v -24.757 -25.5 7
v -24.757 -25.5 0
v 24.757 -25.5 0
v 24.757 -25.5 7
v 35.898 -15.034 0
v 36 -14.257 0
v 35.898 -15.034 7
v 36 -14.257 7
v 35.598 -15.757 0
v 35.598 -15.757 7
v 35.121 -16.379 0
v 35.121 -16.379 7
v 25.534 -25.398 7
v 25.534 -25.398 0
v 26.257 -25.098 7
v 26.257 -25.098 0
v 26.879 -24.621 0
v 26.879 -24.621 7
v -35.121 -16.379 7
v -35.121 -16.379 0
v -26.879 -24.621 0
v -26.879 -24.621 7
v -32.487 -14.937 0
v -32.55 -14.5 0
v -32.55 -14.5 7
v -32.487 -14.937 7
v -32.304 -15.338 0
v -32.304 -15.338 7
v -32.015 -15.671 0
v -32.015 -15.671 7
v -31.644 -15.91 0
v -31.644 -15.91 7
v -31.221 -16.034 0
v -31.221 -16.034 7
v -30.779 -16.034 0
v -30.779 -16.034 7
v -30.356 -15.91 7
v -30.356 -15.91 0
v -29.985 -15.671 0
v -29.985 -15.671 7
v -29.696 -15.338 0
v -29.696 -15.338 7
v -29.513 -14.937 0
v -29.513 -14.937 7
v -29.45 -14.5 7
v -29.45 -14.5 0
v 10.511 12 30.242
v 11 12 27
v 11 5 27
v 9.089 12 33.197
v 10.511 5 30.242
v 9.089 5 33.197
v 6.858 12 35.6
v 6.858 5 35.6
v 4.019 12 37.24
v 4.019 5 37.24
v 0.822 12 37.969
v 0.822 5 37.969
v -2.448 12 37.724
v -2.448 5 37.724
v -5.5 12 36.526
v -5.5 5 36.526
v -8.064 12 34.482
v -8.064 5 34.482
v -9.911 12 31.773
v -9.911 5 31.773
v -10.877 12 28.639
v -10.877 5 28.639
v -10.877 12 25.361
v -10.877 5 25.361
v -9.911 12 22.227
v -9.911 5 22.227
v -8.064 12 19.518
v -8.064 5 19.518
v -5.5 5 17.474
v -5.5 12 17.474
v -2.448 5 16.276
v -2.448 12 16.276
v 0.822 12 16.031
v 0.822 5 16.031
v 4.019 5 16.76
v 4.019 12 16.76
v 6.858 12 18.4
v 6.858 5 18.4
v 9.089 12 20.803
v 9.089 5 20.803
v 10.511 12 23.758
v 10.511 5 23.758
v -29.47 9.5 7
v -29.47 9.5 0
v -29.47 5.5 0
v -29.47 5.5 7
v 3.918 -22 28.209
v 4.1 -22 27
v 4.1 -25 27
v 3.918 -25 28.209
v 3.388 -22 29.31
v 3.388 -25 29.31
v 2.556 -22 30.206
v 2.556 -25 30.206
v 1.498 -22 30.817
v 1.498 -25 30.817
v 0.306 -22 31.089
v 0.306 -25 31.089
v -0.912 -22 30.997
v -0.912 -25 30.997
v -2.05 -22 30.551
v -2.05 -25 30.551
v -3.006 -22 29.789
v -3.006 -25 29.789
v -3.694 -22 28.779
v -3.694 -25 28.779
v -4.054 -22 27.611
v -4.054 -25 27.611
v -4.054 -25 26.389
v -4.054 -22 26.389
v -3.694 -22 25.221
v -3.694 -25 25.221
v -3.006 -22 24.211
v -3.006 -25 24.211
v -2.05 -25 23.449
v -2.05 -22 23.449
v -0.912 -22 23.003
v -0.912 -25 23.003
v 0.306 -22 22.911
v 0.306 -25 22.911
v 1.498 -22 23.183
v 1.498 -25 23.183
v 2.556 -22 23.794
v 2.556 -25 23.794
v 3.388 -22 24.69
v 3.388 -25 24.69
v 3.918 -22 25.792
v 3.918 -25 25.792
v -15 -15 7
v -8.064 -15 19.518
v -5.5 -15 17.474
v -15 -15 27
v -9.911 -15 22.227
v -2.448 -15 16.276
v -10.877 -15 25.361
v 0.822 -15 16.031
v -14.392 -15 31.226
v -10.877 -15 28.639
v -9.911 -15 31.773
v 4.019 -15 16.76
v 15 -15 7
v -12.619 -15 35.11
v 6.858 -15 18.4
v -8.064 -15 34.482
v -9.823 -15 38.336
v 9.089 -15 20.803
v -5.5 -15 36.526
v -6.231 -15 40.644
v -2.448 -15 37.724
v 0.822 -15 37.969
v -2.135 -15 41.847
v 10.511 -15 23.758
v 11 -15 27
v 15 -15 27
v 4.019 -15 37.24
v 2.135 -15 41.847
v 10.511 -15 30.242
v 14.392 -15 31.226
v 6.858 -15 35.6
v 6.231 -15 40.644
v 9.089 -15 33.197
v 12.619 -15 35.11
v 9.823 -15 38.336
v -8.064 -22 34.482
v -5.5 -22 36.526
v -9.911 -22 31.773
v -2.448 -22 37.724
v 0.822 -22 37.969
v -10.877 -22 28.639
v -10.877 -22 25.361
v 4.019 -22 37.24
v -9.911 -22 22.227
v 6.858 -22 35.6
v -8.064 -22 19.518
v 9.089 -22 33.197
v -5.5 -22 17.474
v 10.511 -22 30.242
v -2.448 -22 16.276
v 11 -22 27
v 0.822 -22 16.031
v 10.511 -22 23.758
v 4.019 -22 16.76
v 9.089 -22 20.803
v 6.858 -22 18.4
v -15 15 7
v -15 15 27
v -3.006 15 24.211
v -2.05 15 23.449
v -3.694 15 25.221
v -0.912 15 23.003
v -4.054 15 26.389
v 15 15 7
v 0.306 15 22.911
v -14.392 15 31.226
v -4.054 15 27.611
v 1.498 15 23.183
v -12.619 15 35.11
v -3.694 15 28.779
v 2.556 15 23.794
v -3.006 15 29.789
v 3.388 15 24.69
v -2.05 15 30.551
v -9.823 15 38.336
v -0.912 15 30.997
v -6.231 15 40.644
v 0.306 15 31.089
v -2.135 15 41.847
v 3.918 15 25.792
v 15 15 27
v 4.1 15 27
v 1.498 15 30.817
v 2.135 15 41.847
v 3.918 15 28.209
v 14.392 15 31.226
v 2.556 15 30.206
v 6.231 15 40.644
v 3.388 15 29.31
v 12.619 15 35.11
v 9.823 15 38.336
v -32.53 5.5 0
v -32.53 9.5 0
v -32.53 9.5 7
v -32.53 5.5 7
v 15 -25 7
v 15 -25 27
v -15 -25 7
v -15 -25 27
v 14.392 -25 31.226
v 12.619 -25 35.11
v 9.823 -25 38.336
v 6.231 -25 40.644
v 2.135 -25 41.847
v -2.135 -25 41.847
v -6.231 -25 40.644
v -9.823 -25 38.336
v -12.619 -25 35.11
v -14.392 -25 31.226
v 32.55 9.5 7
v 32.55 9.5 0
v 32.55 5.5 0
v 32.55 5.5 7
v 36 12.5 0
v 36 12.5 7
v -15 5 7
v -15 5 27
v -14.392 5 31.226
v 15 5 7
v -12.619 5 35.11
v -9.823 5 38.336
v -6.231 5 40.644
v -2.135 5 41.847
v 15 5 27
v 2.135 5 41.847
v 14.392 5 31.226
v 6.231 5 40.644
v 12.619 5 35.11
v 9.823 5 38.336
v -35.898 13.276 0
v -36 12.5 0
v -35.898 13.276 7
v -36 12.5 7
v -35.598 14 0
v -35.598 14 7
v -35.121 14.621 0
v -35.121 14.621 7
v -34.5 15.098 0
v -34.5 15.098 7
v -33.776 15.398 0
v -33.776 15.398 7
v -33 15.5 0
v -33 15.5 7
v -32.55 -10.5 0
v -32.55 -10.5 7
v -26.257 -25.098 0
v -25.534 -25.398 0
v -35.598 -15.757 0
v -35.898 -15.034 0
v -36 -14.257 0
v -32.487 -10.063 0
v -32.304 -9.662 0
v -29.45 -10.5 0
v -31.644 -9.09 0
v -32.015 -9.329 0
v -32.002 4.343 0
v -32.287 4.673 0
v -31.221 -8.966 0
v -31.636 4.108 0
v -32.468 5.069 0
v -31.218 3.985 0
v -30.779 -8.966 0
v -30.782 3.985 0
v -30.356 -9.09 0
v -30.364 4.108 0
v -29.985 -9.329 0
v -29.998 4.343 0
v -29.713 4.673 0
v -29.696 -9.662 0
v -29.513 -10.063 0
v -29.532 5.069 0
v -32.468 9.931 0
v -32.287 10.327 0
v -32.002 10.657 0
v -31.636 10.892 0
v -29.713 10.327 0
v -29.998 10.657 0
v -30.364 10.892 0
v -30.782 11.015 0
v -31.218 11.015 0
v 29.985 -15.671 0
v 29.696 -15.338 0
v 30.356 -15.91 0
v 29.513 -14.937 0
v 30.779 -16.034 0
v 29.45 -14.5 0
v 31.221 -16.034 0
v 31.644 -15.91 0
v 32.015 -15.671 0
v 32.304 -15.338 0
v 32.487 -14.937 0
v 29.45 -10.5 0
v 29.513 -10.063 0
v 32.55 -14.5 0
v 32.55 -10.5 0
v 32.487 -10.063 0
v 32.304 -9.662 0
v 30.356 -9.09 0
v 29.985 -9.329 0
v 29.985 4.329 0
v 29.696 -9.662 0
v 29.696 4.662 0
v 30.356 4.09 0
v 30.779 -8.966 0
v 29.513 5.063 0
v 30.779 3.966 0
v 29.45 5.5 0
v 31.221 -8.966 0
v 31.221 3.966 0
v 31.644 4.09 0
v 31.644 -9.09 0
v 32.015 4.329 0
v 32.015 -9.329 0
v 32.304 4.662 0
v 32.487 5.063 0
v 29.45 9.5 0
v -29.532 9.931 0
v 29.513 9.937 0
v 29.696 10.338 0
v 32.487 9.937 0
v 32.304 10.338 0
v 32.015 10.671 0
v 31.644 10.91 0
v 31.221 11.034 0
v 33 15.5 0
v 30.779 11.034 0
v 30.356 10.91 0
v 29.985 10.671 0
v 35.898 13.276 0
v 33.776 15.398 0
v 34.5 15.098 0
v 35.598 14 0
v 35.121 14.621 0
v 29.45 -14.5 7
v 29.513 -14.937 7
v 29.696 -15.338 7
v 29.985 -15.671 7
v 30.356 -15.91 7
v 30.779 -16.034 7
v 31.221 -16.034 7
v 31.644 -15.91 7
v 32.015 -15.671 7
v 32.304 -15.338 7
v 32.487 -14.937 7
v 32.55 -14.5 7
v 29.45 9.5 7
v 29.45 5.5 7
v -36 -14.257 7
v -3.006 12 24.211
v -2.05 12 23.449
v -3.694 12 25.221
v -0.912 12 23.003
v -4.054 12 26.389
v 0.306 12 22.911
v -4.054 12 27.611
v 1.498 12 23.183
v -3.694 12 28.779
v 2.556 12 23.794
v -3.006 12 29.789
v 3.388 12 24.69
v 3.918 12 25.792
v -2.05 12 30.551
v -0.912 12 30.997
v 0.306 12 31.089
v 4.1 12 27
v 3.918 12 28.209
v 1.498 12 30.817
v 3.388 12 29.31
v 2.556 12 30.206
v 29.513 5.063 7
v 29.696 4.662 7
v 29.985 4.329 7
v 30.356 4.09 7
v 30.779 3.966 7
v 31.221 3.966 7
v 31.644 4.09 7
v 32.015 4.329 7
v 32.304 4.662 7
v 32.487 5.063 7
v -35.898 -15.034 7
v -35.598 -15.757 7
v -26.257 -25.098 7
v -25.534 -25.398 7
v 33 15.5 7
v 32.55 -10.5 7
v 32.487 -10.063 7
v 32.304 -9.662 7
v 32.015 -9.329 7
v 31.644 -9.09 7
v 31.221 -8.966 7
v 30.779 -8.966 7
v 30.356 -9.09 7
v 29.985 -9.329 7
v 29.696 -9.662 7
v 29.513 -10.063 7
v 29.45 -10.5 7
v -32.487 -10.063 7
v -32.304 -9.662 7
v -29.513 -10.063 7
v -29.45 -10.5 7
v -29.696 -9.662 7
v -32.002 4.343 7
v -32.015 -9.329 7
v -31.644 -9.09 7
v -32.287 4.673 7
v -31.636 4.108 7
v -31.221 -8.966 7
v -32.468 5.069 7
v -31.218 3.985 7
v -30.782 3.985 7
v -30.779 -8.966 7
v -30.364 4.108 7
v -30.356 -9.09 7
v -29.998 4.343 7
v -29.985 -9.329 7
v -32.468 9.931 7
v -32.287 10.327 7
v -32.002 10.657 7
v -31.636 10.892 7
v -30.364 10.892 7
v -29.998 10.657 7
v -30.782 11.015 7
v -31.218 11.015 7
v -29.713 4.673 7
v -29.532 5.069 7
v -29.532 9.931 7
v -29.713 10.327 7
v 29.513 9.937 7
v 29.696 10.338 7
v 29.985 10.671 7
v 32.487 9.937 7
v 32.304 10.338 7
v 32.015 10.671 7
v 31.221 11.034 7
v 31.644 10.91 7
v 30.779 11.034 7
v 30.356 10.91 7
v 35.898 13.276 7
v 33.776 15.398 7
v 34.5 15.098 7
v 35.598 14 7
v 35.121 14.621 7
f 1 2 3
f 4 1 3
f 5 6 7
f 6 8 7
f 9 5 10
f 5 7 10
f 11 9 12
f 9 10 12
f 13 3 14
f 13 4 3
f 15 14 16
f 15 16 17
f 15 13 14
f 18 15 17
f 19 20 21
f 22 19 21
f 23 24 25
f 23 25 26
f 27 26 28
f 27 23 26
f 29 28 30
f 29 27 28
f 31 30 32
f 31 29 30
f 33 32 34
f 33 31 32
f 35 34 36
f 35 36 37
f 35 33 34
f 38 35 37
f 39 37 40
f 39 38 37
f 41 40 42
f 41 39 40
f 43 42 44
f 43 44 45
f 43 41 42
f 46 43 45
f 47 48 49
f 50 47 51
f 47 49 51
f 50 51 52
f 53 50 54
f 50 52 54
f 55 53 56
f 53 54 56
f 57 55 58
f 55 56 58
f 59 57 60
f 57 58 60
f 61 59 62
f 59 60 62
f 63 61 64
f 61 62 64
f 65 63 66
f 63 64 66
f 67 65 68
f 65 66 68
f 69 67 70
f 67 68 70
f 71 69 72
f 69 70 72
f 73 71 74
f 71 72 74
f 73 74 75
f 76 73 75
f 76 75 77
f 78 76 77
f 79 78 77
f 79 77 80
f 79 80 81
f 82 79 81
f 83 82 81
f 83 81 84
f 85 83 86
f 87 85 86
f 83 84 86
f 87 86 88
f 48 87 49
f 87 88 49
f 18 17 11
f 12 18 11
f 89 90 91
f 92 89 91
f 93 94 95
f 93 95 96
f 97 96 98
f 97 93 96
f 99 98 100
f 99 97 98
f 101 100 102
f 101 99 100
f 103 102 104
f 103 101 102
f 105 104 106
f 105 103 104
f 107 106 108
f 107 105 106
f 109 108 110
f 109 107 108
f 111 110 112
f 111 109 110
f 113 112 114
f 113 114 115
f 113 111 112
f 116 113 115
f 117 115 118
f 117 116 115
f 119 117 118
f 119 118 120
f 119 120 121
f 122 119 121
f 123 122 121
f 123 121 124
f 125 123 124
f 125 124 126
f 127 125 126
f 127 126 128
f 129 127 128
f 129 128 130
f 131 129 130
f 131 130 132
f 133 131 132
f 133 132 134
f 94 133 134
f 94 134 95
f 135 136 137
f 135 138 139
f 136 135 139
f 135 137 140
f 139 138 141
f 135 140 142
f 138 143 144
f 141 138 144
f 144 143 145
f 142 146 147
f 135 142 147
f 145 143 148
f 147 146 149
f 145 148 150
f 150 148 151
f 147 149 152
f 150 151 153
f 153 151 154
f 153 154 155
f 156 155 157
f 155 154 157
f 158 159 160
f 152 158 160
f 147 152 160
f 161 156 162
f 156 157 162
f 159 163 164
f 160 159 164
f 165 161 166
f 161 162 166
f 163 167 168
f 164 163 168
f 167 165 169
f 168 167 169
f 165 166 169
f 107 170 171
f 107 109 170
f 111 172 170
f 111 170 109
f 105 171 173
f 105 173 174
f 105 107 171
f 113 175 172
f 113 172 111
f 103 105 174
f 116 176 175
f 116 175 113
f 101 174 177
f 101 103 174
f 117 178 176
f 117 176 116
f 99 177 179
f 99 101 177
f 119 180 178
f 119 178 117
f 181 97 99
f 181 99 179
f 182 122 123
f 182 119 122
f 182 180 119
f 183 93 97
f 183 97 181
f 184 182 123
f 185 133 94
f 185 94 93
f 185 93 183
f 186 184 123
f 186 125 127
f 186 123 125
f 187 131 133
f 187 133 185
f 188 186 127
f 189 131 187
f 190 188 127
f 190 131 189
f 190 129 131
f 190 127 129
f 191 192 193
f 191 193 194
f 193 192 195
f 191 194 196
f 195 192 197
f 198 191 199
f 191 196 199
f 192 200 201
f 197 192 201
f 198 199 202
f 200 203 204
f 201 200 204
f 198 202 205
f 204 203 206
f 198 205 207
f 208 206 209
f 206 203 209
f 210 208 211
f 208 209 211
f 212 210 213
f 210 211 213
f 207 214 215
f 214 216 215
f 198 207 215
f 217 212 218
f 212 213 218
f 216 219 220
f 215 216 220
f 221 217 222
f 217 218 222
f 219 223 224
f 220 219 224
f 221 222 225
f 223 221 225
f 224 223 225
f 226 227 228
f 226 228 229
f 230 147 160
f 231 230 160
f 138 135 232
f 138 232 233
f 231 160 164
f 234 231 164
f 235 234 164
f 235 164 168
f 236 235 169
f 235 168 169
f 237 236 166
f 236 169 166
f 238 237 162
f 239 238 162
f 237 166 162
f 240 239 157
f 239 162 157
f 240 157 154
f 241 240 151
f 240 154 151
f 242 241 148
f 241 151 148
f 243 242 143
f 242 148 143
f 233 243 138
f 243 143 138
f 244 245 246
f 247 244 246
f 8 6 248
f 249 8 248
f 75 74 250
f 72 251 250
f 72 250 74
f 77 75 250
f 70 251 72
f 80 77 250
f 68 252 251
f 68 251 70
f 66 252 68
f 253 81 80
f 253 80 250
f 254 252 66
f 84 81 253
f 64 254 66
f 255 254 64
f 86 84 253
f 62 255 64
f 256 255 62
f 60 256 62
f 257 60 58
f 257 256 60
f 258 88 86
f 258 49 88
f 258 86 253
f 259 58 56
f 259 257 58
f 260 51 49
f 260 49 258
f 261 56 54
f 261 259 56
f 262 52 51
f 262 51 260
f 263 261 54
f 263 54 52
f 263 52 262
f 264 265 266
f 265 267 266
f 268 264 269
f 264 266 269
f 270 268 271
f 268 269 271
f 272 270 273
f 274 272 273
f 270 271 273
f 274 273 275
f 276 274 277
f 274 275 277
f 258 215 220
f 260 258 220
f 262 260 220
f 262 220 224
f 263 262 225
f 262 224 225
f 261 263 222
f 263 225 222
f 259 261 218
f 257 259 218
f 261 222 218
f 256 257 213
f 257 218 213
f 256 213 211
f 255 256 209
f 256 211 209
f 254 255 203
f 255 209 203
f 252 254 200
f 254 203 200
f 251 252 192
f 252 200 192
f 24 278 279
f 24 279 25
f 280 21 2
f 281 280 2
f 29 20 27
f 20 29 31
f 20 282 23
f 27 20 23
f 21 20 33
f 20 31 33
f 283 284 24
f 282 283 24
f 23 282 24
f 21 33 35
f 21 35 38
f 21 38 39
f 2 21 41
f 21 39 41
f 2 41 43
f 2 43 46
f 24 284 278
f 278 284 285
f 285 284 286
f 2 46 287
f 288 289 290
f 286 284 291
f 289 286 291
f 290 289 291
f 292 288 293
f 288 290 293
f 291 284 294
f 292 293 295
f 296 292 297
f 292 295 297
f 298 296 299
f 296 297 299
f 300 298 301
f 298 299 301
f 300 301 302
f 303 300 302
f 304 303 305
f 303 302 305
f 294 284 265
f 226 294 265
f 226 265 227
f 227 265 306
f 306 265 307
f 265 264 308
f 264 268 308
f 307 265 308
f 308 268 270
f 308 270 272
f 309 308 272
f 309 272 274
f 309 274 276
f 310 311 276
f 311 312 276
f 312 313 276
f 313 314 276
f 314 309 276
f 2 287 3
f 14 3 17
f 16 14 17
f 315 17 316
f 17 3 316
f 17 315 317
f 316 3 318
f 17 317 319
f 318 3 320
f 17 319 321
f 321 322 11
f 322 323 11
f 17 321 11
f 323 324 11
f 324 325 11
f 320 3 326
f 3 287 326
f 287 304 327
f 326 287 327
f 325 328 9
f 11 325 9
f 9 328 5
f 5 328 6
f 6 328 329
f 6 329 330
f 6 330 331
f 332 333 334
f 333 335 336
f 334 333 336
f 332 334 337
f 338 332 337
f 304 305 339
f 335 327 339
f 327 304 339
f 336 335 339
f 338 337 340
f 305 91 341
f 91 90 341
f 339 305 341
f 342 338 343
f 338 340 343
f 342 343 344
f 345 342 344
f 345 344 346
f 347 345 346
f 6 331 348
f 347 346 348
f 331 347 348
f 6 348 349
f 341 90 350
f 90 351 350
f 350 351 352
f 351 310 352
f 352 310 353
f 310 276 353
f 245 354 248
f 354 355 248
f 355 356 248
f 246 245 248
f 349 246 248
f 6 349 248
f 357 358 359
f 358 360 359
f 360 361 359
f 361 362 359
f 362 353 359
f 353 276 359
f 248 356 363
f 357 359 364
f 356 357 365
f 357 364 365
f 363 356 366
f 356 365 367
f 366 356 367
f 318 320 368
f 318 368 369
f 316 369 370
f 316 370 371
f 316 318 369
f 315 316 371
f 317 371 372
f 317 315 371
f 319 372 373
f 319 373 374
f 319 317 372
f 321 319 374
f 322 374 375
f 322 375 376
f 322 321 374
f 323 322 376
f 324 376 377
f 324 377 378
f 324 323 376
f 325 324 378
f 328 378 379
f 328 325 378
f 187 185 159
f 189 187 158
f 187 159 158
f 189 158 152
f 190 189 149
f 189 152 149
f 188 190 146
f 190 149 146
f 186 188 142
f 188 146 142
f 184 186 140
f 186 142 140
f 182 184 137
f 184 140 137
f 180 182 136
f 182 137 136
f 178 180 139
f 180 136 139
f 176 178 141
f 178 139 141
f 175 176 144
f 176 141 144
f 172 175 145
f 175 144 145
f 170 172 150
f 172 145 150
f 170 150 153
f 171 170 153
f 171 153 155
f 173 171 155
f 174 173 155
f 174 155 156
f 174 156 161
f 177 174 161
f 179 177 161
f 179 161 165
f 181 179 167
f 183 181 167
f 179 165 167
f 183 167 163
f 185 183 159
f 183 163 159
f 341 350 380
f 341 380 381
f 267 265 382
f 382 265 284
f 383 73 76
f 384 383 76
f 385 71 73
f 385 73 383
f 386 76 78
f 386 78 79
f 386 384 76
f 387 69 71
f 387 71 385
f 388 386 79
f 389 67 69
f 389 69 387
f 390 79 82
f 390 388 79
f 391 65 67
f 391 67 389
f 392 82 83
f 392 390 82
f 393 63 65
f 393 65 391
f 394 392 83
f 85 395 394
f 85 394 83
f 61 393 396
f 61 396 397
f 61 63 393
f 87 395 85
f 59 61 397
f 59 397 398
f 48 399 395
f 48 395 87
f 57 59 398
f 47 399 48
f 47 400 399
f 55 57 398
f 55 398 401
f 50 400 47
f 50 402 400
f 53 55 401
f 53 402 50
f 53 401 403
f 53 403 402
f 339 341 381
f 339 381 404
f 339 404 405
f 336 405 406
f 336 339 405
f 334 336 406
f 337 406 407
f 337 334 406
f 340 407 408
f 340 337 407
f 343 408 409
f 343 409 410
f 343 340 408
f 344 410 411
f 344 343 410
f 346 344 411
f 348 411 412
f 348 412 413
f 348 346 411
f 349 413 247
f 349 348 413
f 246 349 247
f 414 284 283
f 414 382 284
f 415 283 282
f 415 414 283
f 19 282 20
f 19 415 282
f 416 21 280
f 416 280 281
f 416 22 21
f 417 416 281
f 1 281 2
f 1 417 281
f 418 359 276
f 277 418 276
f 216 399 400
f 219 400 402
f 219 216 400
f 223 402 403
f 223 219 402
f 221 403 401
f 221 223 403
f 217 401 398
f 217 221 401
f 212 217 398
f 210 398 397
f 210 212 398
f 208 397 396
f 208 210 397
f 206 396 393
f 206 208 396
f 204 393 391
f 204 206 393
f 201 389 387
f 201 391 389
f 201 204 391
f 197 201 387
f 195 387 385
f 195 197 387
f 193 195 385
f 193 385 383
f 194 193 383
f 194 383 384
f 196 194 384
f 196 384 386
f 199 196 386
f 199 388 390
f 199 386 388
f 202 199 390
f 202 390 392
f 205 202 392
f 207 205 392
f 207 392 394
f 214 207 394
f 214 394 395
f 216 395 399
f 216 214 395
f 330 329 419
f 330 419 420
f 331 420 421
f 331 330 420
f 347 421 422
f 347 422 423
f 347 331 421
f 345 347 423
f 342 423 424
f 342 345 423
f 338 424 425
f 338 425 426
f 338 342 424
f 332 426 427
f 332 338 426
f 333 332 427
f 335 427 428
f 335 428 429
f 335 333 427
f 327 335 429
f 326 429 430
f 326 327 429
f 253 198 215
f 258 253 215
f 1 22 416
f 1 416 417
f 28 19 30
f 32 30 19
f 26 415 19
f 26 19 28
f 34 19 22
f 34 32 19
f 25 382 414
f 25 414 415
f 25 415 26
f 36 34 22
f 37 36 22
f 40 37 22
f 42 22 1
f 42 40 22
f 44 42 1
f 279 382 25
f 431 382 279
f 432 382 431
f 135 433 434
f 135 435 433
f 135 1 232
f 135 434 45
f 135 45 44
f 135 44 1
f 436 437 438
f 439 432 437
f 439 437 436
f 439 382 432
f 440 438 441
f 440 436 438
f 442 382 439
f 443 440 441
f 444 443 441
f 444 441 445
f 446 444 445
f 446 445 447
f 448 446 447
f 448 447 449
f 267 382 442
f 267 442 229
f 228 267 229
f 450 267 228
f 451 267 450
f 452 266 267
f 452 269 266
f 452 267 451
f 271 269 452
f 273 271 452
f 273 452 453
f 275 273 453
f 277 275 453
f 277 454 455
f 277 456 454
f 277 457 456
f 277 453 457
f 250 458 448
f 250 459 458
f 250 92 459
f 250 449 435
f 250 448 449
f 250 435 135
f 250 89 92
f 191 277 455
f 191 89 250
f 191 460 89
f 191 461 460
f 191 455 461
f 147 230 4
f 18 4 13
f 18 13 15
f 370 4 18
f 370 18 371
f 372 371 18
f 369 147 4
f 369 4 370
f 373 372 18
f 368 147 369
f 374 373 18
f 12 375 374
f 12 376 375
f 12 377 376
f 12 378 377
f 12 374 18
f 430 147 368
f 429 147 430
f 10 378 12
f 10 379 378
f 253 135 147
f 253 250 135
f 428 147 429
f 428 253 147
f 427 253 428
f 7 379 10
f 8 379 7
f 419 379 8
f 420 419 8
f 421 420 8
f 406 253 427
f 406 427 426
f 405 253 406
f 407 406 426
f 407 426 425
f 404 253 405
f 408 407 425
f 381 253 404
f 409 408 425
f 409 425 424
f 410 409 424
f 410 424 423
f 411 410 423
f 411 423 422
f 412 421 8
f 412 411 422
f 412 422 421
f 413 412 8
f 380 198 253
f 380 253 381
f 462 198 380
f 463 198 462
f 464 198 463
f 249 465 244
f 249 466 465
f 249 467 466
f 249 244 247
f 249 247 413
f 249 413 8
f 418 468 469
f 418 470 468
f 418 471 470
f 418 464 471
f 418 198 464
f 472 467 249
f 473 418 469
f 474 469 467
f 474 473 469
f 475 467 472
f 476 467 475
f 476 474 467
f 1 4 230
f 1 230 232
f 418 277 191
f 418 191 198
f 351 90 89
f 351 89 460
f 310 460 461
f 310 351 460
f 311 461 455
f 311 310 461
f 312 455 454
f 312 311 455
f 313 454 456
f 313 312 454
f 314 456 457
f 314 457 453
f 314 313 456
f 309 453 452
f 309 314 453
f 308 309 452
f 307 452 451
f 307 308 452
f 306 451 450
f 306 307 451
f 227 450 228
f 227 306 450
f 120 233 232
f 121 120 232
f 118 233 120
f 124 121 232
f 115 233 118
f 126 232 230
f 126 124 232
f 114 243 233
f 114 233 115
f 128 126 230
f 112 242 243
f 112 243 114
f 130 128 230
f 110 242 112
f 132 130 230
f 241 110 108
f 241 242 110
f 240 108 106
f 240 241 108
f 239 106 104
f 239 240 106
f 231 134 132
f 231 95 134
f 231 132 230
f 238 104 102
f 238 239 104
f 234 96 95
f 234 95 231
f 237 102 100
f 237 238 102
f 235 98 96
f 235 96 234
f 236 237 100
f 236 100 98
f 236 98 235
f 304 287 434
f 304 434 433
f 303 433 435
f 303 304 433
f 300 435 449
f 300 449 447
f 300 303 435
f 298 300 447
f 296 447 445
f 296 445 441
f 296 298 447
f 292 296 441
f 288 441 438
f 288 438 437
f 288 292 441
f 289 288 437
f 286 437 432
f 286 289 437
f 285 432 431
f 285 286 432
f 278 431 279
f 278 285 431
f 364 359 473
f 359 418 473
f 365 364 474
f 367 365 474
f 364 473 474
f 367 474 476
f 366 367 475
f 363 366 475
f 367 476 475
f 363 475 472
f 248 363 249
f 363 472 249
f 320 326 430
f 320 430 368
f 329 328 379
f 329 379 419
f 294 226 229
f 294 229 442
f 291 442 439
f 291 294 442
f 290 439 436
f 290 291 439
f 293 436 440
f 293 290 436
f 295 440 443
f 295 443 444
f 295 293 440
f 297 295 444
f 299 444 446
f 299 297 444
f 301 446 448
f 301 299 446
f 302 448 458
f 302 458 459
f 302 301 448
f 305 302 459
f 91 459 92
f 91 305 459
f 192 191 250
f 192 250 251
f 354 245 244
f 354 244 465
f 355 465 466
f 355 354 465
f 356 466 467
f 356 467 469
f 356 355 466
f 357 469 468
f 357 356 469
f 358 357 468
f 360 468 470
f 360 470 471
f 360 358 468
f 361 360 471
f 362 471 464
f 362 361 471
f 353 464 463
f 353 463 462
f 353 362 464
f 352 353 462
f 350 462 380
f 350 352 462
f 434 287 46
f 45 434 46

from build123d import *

# Parameters (mm, degrees)
SKETCH004_R     = 4.1
PAD002_DEPTH    = 10
SKETCH005_R     = 11
POCKET001_DEPTH = 7
PAD_DEPTH       = 7
FILLET_R        = 3
SKETCH002_R     = 4.1
PAD001_DEPTH    = 10
SKETCH003_R     = 11
POCKET_DEPTH    = 7


with BuildPart() as pocket001:
    # Sketch004 → Pad002 (new body)
    with BuildSketch(Plane.XZ.offset(15)):
        with BuildLine():
            Line((-15, 7), (15, 7))
            Line((15, 7), (15, 27))
            ThreePointArc((15, 27), (0, 42.000006), (-15, 27))
            Line((-15, 7), (-15, 27))
        make_face()
        with Locations((0, 27.000006)):
            Circle(SKETCH004_R, mode=Mode.SUBTRACT)
    extrude(amount=PAD002_DEPTH)

    # Sketch005 → Pocket001 (cut)
    with BuildSketch(Plane(origin=(0, -15, 0), x_dir=(1, 0, 0), z_dir=(0, 1, 0))):
        with Locations((0, -27.000006)):
            Circle(SKETCH005_R)
    extrude(amount=-POCKET001_DEPTH, mode=Mode.SUBTRACT)


with BuildPart() as grundplatte001:
    # Sketch → Pad (new body)
    with BuildSketch(Plane.XY):
        Polygon((-36, 15.5), (-36, -15.5), (-26, -25.5), (26, -25.5), (36, -15.5), (36, 15.5), align=None)
        with BuildLine():
            Line((-32.53033, 9.500002), (-32.53033, 5.5))
            ThreePointArc((-32.53033, 5.5), (-31, 3.96967), (-29.46967, 5.5))
            Line((-29.46967, 9.500002), (-29.46967, 5.5))
            ThreePointArc((-29.46967, 9.500002), (-31, 11.03033), (-32.53033, 9.500002))
        make_face(mode=Mode.SUBTRACT)
        with BuildLine():
            Line((-32.55, -10.499998), (-32.55, -14.5))
            ThreePointArc((-32.55, -14.5), (-31, -16.05), (-29.45, -14.5))
            Line((-29.45, -10.499998), (-29.45, -14.5))
            ThreePointArc((-29.45, -10.499998), (-31, -8.95), (-32.55, -10.499998))
        make_face(mode=Mode.SUBTRACT)
        with BuildLine():
            Line((29.45, -10.500011), (29.45, -14.500004))
            ThreePointArc((29.45, -14.500004), (31, -16.05), (32.55, -14.500004))
            Line((32.55, -14.500004), (32.55, -10.500011))
            ThreePointArc((32.55, -10.500011), (31, -8.95), (29.45, -10.500011))
        make_face(mode=Mode.SUBTRACT)
        with BuildLine():
            Line((32.55, 9.500002), (32.55, 5.5))
            ThreePointArc((29.45, 5.5), (31, 3.95), (32.55, 5.5))
            Line((29.45, 9.500002), (29.45, 5.5))
            ThreePointArc((32.55, 9.500002), (31, 11.05), (29.45, 9.500002))
        make_face(mode=Mode.SUBTRACT)
    extrude(amount=PAD_DEPTH)

    # Fillet
    fillet_edges = [grundplatte001.edges().sort_by_distance(p)[0] for p in [
        (26, -25.5, 3.5),
        (-26, -25.5, 3.5),
        (36, -15.5, 3.5),
        (-36, -15.5, 3.5),
        (36, 15.5, 3.5),
        (-36, 15.5, 3.5),
    ]]
    fillet(fillet_edges, radius=FILLET_R)


with BuildPart() as fusion001:
    # Fusion001 base: copy of Grundplatte001
    add(grundplatte001.part)

    # Fusion001: union Pocket001
    add(pocket001.part)


with BuildPart() as lagerbock:
    # Sketch002 → Pad001 (new body)
    with BuildSketch(Plane.XZ.offset(-15)):
        with BuildLine():
            Line((-15, 7), (15, 7))
            Line((15, 7), (15, 27))
            ThreePointArc((15, 27), (0, 42.000006), (-15, 27))
            Line((-15, 7), (-15, 27))
        make_face()
        with Locations((0, 27.000006)):
            Circle(SKETCH002_R, mode=Mode.SUBTRACT)
    extrude(amount=PAD001_DEPTH)

    # Sketch003 → Pocket (cut)
    with BuildSketch(Plane.XZ.offset(-5)):
        with Locations((0, 27.000006)):
            Circle(SKETCH003_R)
    extrude(amount=-POCKET_DEPTH, mode=Mode.SUBTRACT)


with BuildPart() as fusion002:
    # Fusion base: copy of Grundplatte001
    add(grundplatte001.part)

    # Fusion: union Lagerbock
    add(lagerbock.part)

    # Fusion002: union Fusion001
    add(fusion001.part)


solid = fusion002.part
